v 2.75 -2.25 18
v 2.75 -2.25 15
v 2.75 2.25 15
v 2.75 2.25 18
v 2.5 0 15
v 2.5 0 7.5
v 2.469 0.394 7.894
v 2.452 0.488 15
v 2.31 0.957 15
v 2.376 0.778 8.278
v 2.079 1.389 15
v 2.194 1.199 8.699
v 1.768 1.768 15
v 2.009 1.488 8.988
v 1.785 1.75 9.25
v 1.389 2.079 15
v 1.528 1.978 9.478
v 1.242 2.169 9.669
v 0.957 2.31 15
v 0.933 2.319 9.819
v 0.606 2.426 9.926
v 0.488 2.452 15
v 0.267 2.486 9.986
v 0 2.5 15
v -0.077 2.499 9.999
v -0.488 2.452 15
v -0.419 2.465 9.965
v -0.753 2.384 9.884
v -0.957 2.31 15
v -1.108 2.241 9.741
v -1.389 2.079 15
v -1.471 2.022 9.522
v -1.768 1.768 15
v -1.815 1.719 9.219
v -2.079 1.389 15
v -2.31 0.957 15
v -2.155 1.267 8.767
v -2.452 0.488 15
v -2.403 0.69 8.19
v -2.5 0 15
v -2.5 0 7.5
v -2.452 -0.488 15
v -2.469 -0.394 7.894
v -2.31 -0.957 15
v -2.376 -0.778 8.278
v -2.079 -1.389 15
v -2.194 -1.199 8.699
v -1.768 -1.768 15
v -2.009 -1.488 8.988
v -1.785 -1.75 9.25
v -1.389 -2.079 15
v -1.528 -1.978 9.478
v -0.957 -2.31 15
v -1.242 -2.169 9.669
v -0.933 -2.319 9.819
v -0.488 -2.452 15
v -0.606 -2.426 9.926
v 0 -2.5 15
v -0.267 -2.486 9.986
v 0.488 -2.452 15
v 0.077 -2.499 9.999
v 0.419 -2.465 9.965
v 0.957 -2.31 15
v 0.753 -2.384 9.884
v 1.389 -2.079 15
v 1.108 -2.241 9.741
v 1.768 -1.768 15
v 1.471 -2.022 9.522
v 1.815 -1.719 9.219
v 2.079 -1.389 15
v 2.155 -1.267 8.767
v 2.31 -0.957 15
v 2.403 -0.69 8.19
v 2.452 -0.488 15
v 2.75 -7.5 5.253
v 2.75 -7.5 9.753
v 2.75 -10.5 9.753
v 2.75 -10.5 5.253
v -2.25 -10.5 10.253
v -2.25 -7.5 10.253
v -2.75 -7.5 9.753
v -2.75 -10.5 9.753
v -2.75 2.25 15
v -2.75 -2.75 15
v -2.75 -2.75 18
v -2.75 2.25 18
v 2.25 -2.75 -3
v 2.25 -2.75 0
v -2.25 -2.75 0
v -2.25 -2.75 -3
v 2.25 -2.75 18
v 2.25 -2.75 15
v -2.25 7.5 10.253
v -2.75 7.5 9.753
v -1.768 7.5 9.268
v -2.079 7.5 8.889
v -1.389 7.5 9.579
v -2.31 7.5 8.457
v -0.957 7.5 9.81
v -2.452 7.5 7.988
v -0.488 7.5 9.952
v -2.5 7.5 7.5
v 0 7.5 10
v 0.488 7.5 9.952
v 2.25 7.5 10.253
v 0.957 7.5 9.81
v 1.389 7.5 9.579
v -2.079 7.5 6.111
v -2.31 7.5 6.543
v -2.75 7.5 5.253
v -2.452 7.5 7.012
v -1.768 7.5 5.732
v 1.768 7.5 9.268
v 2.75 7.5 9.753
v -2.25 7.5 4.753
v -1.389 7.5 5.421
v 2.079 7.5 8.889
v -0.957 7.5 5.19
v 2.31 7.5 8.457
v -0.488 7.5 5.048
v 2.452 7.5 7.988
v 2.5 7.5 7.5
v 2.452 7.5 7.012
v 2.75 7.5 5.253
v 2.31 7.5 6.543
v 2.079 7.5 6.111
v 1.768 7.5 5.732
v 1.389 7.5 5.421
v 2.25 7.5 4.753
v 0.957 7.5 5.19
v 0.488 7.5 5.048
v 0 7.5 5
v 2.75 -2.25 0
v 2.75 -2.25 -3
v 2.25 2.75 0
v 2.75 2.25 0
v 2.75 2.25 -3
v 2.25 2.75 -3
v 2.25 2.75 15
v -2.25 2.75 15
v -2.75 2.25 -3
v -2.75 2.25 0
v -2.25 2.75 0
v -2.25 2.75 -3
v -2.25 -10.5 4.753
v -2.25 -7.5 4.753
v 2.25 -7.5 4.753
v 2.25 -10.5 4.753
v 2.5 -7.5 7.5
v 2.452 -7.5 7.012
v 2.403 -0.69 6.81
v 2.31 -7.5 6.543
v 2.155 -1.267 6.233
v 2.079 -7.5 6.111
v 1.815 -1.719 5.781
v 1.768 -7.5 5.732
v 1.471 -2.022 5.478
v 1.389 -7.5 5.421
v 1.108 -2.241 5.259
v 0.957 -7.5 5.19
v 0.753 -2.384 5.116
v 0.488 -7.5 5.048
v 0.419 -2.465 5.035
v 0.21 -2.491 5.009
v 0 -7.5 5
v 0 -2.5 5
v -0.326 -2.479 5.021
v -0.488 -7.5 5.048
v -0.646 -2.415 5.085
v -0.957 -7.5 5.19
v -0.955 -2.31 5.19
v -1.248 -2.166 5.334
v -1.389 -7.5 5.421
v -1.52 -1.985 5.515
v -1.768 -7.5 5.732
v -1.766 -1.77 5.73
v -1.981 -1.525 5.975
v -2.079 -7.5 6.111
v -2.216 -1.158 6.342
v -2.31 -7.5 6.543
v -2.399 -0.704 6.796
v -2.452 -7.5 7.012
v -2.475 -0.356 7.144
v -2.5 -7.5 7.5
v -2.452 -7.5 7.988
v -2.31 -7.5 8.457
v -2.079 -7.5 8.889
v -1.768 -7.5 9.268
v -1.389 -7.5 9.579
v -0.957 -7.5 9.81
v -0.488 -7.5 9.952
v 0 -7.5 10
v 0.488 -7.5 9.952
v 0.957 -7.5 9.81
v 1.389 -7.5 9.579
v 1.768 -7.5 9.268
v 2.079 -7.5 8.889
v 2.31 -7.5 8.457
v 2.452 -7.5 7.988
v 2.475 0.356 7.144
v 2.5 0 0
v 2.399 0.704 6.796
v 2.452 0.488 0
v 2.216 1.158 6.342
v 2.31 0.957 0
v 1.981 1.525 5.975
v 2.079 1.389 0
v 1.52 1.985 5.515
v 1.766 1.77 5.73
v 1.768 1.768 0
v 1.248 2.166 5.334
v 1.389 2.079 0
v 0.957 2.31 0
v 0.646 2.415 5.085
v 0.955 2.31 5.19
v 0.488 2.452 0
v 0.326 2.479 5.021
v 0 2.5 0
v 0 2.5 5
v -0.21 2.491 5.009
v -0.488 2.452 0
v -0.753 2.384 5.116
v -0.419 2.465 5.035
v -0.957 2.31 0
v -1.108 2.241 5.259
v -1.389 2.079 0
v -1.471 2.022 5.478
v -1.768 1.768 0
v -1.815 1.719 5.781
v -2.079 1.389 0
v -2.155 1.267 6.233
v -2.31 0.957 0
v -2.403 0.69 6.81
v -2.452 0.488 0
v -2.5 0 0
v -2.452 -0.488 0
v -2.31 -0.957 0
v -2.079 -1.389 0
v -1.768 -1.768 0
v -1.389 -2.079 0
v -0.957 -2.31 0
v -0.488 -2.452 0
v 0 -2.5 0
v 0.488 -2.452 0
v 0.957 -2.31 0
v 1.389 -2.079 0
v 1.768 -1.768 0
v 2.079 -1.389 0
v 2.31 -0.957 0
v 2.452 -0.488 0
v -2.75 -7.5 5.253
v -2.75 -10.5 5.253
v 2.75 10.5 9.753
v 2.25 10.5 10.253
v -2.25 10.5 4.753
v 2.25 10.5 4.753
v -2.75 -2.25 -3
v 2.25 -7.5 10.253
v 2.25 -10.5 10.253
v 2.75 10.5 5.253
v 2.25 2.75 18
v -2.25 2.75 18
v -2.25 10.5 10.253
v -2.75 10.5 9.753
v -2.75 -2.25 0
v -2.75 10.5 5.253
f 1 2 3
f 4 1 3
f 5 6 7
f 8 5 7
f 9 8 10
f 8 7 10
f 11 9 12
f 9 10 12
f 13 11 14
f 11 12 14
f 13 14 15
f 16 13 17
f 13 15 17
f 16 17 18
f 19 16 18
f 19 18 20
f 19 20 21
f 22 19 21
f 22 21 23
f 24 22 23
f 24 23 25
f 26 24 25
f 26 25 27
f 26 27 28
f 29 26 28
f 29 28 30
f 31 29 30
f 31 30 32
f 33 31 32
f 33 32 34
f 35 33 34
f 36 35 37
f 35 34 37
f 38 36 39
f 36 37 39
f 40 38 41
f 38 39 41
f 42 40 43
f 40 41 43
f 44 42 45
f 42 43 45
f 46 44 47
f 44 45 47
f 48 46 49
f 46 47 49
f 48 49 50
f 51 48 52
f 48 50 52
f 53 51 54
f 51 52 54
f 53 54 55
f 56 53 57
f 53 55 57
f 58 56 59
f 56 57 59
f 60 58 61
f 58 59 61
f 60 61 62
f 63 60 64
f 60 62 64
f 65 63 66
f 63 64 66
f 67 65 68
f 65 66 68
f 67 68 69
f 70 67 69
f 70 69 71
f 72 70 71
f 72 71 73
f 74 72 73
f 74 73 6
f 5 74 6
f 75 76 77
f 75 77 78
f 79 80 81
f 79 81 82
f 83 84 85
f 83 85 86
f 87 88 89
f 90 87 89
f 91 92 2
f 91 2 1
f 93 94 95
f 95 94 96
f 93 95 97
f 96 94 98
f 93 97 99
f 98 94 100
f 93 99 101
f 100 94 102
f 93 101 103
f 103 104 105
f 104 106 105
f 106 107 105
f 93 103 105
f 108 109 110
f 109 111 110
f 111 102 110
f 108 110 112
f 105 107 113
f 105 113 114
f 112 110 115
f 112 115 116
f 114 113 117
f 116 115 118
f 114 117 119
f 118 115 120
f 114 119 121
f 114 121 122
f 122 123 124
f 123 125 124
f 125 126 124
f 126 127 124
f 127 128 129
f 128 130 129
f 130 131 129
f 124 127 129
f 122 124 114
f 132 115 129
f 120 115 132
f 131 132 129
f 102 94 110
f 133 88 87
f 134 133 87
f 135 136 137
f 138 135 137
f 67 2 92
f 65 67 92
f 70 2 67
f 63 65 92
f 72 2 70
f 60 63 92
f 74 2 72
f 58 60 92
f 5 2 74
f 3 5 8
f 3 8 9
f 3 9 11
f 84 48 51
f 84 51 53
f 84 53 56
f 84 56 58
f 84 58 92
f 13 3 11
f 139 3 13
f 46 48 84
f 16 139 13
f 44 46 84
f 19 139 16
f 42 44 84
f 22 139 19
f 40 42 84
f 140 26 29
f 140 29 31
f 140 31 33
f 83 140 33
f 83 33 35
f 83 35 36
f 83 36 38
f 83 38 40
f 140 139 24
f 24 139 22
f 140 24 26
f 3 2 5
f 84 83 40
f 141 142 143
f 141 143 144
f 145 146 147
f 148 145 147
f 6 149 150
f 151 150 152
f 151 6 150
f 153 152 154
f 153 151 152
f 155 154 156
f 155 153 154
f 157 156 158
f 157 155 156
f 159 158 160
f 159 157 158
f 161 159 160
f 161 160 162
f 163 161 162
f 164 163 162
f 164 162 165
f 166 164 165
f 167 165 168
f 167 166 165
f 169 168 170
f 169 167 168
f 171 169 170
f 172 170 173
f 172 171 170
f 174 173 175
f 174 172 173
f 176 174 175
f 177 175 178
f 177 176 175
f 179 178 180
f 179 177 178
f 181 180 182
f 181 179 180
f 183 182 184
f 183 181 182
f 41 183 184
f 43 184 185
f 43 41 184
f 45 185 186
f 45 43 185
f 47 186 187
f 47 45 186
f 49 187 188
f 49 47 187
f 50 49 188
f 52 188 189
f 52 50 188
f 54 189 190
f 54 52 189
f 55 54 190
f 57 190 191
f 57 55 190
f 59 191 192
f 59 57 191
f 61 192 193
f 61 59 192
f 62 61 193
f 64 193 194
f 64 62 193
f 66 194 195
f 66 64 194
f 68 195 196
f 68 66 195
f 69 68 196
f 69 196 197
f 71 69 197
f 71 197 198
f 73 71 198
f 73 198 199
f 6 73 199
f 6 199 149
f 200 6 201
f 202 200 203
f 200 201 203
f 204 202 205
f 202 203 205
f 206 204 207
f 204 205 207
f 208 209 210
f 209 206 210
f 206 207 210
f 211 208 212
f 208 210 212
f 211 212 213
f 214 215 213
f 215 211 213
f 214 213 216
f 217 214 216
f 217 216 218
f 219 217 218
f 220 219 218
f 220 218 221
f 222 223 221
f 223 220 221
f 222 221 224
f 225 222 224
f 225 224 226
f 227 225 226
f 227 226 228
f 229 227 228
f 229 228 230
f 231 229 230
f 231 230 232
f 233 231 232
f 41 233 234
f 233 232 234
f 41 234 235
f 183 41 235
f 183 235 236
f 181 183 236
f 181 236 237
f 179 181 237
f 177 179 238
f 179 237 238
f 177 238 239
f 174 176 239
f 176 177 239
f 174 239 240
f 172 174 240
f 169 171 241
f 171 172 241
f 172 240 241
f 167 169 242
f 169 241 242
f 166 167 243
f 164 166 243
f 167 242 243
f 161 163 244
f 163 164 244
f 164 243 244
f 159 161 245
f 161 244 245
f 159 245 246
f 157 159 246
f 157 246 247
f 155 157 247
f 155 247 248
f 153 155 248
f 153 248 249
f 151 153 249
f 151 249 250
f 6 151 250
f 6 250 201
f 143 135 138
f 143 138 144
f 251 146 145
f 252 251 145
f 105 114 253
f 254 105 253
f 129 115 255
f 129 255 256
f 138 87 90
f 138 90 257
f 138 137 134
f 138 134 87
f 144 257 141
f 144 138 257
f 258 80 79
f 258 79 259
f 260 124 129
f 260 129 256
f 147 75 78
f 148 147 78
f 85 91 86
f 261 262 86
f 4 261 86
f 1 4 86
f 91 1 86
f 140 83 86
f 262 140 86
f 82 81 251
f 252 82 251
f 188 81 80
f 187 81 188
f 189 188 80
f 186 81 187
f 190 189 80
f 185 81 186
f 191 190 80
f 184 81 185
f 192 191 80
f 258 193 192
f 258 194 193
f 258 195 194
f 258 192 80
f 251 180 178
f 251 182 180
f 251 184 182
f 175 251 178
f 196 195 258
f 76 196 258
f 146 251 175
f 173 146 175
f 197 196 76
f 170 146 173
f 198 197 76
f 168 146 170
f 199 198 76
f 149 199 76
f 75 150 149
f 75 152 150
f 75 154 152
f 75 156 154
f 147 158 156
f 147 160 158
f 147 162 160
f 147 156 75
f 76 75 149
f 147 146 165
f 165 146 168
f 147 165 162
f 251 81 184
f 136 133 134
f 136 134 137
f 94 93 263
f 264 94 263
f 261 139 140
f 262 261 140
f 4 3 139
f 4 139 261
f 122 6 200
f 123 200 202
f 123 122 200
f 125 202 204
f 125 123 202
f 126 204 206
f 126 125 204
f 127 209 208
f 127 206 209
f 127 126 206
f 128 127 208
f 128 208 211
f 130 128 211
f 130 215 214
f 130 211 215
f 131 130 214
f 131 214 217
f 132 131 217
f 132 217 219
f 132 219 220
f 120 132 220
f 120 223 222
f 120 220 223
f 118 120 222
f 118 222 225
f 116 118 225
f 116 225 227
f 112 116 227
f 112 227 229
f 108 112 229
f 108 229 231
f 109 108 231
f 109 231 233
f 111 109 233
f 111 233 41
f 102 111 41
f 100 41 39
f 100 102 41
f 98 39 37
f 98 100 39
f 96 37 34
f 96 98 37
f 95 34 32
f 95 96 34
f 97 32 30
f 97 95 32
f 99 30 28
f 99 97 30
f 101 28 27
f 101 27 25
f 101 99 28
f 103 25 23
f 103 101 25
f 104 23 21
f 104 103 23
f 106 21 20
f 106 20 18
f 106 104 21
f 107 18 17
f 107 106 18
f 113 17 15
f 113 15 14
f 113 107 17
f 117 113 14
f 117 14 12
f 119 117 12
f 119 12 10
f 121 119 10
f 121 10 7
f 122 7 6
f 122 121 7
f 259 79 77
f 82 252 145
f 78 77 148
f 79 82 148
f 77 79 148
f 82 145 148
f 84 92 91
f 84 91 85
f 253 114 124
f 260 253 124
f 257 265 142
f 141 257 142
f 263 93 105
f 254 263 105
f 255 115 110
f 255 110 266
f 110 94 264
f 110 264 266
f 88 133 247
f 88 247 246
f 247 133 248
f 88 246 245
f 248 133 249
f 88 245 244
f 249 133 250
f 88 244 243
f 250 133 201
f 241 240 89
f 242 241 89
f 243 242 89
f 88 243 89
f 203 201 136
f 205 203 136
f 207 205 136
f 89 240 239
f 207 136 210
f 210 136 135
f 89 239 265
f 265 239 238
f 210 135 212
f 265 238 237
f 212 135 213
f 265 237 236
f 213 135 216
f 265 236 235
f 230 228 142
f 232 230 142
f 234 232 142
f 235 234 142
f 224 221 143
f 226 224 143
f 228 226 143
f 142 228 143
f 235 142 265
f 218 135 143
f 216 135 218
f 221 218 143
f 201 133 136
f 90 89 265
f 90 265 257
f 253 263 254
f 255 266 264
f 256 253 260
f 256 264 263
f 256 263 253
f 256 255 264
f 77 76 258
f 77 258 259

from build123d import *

# Parameters (mm, degrees)
SKETCH1_R                = 2.5
BOSS_EXTRUDE1_DEPTH      = 15
SKETCH3_R                = 2.5
BOSS_EXTRUDE2_DEPTH      = 7.5
SKETCH4_W                = 5.5
SKETCH4_H                = 5.5
BOSS_EXTRUDE3_DEPTH      = 3
CHAMFER1_SIZE            = 0.5
CHAMFER2_SIZE            = 0.5
CHAMFER3_SIZE            = 0.5
CHAMFER1_OF_MIRROR1_SIZE = 0.5
CHAMFER2_OF_MIRROR1_SIZE = 0.5
SKETCH5_W                = 5.5
SKETCH5_H                = 5.5
BOSS_EXTRUDE4_DEPTH      = 3
CHAMFER4_SIZE            = 0.5
CHAMFER5_SIZE            = 0.5
CHAMFER4_OF_MIRROR2_SIZE = 0.5
CHAMFER5_OF_MIRROR2_SIZE = 0.5


with BuildPart() as part:
    # Sketch1 → Boss-Extrude1 (new body)
    with BuildSketch(Plane.XY):
        Circle(SKETCH1_R)
    extrude(amount=BOSS_EXTRUDE1_DEPTH)

    # Sketch3 → Boss-Extrude2 (add, symmetric)
    with BuildSketch(Plane(origin=(0, 0, 0), x_dir=(1, 0, 0), z_dir=(0, 1, 0))):
        with Locations((0, -7.5)):
            Circle(SKETCH3_R)
    extrude(amount=BOSS_EXTRUDE2_DEPTH, both=True)

    # Sketch4 → Boss-Extrude3 (add)
    with BuildSketch(Plane(origin=(0, 0, 0), x_dir=(-1, 0, 0), z_dir=(0, 0, -1))):
        Rectangle(SKETCH4_W, SKETCH4_H)
    boss_extrude3 = extrude(amount=BOSS_EXTRUDE3_DEPTH)

    # Chamfer1
    chamfer1_edges = [part.edges().sort_by_distance(p)[0] for p in [
        (-2.75, 2.75, -1.5),
    ]]
    chamfer(chamfer1_edges, length=CHAMFER1_SIZE)

    # Chamfer2
    chamfer2_edges = [part.edges().sort_by_distance(p)[0] for p in [
        (2.75, 2.75, -1.5),
        (2.75, -2.75, -1.5),
    ]]
    chamfer(chamfer2_edges, length=CHAMFER2_SIZE)

    # Chamfer3
    chamfer3_edges = [part.edges().sort_by_distance(p)[0] for p in [
        (-2.75, -2.75, -1.5),
    ]]
    chamfer(chamfer3_edges, length=CHAMFER3_SIZE)

    # Mirror1: Boss-Extrude3 across plane
    add(boss_extrude3.mirror(Plane(origin=(0, 0, 7.5), x_dir=(1, 0, 0), z_dir=(0, 0, -1))))

    # Chamfer1 of Mirror1
    chamfer1_of_mirror1_edges = [part.edges().sort_by_distance(p)[0] for p in [
        (-2.75, 2.75, 16.5),
    ]]
    chamfer(chamfer1_of_mirror1_edges, length=CHAMFER1_OF_MIRROR1_SIZE)

    # Chamfer2 of Mirror1
    chamfer2_of_mirror1_edges = [part.edges().sort_by_distance(p)[0] for p in [
        (2.75, 2.75, 16.5),
        (2.75, -2.75, 16.5),
    ]]
    chamfer(chamfer2_of_mirror1_edges, length=CHAMFER2_OF_MIRROR1_SIZE)

    # Sketch5 → Boss-Extrude4 (add)
    with BuildSketch(Plane(origin=(0, 7.5, 0), x_dir=(1, 0, 0), z_dir=(0, 1, 0))):
        with Locations((0, -7.502861602)):
            Rectangle(SKETCH5_W, SKETCH5_H)
    boss_extrude4 = extrude(amount=BOSS_EXTRUDE4_DEPTH)

    # Chamfer4
    chamfer4_edges = [part.edges().sort_by_distance(p)[0] for p in [
        (-2.75, 9, 4.752861602),
        (-2.75, 9, 10.252861602),
        (2.75, 9, 4.752861602),
    ]]
    chamfer(chamfer4_edges, length=CHAMFER4_SIZE)

    # Chamfer5
    chamfer5_edges = [part.edges().sort_by_distance(p)[0] for p in [
        (2.75, 9, 10.252861602),
    ]]
    chamfer(chamfer5_edges, length=CHAMFER5_SIZE)

    # Mirror2: Boss-Extrude4 across plane
    add(boss_extrude4.mirror(Plane(origin=(0, 0, 0), x_dir=(0, 0, 1), z_dir=(0, -1, 0))))

    # Chamfer4 of Mirror2
    chamfer4_of_mirror2_edges = [part.edges().sort_by_distance(p)[0] for p in [
        (-2.75, -9, 4.752861602),
        (-2.75, -9, 10.252861602),
        (2.75, -9, 4.752861602),
    ]]
    chamfer(chamfer4_of_mirror2_edges, length=CHAMFER4_OF_MIRROR2_SIZE)

    # Chamfer5 of Mirror2
    chamfer5_of_mirror2_edges = [part.edges().sort_by_distance(p)[0] for p in [
        (2.75, -9, 10.252861602),
    ]]
    chamfer(chamfer5_of_mirror2_edges, length=CHAMFER5_OF_MIRROR2_SIZE)


solid = part.part
